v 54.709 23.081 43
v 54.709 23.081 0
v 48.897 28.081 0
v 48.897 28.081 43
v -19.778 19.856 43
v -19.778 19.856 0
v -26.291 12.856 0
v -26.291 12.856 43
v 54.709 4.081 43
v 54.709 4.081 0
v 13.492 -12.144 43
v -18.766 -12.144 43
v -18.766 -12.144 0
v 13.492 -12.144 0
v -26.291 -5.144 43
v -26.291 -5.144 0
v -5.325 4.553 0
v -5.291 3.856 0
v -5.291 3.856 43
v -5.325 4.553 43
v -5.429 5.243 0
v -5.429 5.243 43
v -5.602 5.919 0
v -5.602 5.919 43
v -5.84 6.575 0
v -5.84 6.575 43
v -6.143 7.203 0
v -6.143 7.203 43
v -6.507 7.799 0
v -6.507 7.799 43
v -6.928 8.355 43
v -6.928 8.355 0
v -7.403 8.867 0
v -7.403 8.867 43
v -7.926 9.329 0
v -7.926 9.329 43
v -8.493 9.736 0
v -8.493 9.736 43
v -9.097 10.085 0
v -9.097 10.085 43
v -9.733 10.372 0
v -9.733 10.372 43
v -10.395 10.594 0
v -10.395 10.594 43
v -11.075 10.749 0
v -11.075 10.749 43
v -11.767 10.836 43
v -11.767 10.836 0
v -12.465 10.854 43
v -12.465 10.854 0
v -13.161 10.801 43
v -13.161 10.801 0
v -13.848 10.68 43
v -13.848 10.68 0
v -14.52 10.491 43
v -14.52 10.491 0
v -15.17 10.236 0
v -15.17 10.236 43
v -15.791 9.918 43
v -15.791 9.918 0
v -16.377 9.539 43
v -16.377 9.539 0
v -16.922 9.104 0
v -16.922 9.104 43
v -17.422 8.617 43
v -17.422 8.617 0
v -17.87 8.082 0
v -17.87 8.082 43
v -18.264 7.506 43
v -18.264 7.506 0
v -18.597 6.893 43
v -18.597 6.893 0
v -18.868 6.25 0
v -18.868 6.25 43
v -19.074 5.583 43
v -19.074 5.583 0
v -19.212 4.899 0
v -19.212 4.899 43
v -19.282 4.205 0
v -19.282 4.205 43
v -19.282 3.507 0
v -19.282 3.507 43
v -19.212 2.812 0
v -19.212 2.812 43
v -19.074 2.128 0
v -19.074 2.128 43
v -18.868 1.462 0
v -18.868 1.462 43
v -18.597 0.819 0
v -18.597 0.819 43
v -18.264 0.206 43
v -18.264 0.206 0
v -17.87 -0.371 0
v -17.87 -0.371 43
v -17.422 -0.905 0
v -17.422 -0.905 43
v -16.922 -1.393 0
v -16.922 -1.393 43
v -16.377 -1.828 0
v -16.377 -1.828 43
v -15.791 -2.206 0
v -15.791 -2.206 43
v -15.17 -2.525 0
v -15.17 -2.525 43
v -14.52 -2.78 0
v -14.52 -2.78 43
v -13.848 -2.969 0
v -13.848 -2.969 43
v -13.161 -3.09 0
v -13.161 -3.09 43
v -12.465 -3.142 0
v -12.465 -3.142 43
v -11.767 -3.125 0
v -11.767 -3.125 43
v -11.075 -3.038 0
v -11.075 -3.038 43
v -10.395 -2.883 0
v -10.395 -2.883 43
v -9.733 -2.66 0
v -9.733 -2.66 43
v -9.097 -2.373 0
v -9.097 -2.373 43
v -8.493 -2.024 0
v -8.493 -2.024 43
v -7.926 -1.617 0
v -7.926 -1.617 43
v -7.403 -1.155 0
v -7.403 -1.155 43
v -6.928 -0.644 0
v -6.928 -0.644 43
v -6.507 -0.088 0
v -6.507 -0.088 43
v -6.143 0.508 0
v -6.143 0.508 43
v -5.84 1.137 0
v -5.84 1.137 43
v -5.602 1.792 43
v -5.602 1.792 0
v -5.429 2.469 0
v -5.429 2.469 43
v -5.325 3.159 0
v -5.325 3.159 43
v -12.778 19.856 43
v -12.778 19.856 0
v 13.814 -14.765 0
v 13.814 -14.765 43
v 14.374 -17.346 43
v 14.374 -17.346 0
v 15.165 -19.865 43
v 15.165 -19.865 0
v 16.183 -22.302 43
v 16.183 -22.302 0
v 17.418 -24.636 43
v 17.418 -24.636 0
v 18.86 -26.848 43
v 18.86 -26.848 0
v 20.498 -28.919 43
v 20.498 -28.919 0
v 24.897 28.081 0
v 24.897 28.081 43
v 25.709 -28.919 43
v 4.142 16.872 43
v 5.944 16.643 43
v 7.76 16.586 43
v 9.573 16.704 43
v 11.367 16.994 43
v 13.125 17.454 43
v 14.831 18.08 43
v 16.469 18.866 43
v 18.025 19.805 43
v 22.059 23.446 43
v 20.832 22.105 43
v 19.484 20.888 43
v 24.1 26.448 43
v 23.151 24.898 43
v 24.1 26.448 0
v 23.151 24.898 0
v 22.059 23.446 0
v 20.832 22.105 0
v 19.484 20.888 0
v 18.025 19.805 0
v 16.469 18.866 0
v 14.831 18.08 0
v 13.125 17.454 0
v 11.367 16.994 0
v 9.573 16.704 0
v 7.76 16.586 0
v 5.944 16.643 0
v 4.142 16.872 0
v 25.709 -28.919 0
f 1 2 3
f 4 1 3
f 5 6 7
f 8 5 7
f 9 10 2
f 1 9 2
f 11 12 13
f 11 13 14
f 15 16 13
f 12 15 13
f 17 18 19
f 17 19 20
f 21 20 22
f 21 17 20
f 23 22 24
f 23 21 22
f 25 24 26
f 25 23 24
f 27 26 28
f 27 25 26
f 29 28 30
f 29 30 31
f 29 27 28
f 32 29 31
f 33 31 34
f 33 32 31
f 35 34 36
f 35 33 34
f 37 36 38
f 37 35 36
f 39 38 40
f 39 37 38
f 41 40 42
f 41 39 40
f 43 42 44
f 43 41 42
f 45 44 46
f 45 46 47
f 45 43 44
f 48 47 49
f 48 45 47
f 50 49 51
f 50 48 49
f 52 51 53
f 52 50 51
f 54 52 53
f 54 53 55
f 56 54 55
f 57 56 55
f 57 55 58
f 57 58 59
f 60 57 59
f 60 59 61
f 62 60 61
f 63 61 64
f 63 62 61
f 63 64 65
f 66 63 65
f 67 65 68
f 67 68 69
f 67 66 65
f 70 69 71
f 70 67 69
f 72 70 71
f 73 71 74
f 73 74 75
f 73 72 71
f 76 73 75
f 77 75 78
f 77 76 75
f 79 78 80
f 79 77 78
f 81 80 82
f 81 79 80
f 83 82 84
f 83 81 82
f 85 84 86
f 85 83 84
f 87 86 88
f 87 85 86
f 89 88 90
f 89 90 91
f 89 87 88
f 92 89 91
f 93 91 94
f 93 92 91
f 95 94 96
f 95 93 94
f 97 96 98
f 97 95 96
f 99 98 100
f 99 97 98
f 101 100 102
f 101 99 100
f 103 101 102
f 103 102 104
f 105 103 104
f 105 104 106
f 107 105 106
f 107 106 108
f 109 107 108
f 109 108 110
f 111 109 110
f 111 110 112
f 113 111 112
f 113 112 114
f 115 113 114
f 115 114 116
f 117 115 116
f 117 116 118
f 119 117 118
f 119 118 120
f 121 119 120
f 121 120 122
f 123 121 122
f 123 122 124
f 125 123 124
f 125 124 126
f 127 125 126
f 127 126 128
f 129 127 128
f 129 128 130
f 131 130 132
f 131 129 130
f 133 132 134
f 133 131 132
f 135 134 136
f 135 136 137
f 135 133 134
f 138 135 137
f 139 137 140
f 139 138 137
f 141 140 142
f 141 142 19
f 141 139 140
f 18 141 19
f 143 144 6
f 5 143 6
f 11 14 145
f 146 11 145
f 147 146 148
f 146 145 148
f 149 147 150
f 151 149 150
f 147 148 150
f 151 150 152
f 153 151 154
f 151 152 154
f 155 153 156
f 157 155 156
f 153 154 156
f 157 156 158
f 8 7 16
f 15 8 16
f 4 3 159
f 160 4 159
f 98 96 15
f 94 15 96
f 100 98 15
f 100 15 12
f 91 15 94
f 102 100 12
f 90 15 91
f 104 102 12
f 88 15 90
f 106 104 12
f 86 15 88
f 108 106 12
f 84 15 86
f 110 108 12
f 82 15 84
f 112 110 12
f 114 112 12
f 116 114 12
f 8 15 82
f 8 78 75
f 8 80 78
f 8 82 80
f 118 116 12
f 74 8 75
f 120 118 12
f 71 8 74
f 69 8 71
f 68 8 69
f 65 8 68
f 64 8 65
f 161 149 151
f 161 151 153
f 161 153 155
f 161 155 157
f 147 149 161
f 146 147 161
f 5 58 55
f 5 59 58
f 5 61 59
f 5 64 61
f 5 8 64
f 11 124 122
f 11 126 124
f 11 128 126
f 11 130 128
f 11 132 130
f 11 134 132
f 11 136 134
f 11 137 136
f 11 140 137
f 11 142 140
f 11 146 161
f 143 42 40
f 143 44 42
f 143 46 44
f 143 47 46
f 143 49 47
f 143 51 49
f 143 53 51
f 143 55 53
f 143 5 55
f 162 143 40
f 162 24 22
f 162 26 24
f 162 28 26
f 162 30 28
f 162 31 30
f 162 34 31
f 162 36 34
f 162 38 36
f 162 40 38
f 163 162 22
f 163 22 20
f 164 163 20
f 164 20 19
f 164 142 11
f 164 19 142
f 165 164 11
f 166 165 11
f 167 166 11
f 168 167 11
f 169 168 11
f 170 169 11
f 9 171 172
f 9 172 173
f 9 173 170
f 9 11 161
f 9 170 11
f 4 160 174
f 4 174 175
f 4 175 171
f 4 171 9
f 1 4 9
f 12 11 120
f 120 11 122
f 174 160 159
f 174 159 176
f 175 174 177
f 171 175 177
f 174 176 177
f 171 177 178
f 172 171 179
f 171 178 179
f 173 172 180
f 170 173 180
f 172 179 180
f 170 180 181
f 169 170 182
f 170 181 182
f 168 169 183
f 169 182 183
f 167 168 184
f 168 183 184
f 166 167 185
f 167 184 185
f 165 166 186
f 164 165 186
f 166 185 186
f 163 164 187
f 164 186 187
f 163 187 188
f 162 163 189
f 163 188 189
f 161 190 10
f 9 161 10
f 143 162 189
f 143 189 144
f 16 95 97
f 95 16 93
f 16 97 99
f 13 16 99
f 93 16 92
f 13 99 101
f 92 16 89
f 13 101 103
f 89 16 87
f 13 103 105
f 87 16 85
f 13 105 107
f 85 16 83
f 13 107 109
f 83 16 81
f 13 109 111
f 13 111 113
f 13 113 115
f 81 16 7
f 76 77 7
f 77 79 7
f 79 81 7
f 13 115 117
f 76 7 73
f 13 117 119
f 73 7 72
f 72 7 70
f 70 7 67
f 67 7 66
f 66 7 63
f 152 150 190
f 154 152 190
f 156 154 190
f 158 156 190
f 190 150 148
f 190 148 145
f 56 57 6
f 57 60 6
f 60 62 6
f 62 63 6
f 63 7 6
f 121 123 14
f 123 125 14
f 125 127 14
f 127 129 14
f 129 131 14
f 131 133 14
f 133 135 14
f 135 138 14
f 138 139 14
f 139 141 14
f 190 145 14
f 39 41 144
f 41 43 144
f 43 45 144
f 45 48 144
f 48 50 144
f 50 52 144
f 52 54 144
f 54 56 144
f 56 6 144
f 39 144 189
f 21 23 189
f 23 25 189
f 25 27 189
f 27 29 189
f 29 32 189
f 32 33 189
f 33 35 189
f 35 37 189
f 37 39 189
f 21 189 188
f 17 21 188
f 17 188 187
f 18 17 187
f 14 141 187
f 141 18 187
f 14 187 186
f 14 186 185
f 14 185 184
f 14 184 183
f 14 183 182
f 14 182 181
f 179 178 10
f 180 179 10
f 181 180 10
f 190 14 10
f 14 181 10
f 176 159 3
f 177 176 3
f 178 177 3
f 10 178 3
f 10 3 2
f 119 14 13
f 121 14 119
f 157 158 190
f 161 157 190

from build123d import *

# Parameters (mm, degrees)
SKETCH3_R           = 7
BOSS_EXTRUDE1_DEPTH = 43


with BuildPart() as part:
    # Sketch3 → Boss-Extrude1 (new body)
    with BuildSketch(Plane.XY):
        with BuildLine():
            Line((-18.766263872, -12.144286576), (13.491947319, -12.144286576))
            ThreePointArc((13.491947319, -12.144286576), (15.646337823, -21.094858365), (20.497554358, -28.919168681))
            Line((20.497554358, -28.919168681), (25.709486961, -28.919168681))
            Line((25.709486961, -28.919168681), (54.709486961, 4.080831319))
            Line((54.709486961, 4.080831319), (54.709486961, 23.080831319))
            Line((54.709486961, 23.080831319), (48.896751189, 28.080831319))
            Line((48.896751189, 28.080831319), (24.896751189, 28.080831319))
            ThreePointArc((24.896751189, 28.080831319), (16.469153092, 18.865687614), (4.141554757, 16.872297921))
            Line((4.141554757, 16.872297921), (-12.778235346, 19.855713424))
            Line((-12.778235346, 19.855713424), (-19.778235346, 19.855713424))
            Line((-19.778235346, 19.855713424), (-26.290513039, 12.855713424))
            Line((-26.290513039, 12.855713424), (-26.290513039, -5.144286576))
            Line((-26.290513039, -5.144286576), (-18.766263872, -12.144286576))
        make_face()
        with Locations((-12.290513039, 3.855713424)):
            Circle(SKETCH3_R, mode=Mode.SUBTRACT)
    extrude(amount=BOSS_EXTRUDE1_DEPTH)


solid = part.part
